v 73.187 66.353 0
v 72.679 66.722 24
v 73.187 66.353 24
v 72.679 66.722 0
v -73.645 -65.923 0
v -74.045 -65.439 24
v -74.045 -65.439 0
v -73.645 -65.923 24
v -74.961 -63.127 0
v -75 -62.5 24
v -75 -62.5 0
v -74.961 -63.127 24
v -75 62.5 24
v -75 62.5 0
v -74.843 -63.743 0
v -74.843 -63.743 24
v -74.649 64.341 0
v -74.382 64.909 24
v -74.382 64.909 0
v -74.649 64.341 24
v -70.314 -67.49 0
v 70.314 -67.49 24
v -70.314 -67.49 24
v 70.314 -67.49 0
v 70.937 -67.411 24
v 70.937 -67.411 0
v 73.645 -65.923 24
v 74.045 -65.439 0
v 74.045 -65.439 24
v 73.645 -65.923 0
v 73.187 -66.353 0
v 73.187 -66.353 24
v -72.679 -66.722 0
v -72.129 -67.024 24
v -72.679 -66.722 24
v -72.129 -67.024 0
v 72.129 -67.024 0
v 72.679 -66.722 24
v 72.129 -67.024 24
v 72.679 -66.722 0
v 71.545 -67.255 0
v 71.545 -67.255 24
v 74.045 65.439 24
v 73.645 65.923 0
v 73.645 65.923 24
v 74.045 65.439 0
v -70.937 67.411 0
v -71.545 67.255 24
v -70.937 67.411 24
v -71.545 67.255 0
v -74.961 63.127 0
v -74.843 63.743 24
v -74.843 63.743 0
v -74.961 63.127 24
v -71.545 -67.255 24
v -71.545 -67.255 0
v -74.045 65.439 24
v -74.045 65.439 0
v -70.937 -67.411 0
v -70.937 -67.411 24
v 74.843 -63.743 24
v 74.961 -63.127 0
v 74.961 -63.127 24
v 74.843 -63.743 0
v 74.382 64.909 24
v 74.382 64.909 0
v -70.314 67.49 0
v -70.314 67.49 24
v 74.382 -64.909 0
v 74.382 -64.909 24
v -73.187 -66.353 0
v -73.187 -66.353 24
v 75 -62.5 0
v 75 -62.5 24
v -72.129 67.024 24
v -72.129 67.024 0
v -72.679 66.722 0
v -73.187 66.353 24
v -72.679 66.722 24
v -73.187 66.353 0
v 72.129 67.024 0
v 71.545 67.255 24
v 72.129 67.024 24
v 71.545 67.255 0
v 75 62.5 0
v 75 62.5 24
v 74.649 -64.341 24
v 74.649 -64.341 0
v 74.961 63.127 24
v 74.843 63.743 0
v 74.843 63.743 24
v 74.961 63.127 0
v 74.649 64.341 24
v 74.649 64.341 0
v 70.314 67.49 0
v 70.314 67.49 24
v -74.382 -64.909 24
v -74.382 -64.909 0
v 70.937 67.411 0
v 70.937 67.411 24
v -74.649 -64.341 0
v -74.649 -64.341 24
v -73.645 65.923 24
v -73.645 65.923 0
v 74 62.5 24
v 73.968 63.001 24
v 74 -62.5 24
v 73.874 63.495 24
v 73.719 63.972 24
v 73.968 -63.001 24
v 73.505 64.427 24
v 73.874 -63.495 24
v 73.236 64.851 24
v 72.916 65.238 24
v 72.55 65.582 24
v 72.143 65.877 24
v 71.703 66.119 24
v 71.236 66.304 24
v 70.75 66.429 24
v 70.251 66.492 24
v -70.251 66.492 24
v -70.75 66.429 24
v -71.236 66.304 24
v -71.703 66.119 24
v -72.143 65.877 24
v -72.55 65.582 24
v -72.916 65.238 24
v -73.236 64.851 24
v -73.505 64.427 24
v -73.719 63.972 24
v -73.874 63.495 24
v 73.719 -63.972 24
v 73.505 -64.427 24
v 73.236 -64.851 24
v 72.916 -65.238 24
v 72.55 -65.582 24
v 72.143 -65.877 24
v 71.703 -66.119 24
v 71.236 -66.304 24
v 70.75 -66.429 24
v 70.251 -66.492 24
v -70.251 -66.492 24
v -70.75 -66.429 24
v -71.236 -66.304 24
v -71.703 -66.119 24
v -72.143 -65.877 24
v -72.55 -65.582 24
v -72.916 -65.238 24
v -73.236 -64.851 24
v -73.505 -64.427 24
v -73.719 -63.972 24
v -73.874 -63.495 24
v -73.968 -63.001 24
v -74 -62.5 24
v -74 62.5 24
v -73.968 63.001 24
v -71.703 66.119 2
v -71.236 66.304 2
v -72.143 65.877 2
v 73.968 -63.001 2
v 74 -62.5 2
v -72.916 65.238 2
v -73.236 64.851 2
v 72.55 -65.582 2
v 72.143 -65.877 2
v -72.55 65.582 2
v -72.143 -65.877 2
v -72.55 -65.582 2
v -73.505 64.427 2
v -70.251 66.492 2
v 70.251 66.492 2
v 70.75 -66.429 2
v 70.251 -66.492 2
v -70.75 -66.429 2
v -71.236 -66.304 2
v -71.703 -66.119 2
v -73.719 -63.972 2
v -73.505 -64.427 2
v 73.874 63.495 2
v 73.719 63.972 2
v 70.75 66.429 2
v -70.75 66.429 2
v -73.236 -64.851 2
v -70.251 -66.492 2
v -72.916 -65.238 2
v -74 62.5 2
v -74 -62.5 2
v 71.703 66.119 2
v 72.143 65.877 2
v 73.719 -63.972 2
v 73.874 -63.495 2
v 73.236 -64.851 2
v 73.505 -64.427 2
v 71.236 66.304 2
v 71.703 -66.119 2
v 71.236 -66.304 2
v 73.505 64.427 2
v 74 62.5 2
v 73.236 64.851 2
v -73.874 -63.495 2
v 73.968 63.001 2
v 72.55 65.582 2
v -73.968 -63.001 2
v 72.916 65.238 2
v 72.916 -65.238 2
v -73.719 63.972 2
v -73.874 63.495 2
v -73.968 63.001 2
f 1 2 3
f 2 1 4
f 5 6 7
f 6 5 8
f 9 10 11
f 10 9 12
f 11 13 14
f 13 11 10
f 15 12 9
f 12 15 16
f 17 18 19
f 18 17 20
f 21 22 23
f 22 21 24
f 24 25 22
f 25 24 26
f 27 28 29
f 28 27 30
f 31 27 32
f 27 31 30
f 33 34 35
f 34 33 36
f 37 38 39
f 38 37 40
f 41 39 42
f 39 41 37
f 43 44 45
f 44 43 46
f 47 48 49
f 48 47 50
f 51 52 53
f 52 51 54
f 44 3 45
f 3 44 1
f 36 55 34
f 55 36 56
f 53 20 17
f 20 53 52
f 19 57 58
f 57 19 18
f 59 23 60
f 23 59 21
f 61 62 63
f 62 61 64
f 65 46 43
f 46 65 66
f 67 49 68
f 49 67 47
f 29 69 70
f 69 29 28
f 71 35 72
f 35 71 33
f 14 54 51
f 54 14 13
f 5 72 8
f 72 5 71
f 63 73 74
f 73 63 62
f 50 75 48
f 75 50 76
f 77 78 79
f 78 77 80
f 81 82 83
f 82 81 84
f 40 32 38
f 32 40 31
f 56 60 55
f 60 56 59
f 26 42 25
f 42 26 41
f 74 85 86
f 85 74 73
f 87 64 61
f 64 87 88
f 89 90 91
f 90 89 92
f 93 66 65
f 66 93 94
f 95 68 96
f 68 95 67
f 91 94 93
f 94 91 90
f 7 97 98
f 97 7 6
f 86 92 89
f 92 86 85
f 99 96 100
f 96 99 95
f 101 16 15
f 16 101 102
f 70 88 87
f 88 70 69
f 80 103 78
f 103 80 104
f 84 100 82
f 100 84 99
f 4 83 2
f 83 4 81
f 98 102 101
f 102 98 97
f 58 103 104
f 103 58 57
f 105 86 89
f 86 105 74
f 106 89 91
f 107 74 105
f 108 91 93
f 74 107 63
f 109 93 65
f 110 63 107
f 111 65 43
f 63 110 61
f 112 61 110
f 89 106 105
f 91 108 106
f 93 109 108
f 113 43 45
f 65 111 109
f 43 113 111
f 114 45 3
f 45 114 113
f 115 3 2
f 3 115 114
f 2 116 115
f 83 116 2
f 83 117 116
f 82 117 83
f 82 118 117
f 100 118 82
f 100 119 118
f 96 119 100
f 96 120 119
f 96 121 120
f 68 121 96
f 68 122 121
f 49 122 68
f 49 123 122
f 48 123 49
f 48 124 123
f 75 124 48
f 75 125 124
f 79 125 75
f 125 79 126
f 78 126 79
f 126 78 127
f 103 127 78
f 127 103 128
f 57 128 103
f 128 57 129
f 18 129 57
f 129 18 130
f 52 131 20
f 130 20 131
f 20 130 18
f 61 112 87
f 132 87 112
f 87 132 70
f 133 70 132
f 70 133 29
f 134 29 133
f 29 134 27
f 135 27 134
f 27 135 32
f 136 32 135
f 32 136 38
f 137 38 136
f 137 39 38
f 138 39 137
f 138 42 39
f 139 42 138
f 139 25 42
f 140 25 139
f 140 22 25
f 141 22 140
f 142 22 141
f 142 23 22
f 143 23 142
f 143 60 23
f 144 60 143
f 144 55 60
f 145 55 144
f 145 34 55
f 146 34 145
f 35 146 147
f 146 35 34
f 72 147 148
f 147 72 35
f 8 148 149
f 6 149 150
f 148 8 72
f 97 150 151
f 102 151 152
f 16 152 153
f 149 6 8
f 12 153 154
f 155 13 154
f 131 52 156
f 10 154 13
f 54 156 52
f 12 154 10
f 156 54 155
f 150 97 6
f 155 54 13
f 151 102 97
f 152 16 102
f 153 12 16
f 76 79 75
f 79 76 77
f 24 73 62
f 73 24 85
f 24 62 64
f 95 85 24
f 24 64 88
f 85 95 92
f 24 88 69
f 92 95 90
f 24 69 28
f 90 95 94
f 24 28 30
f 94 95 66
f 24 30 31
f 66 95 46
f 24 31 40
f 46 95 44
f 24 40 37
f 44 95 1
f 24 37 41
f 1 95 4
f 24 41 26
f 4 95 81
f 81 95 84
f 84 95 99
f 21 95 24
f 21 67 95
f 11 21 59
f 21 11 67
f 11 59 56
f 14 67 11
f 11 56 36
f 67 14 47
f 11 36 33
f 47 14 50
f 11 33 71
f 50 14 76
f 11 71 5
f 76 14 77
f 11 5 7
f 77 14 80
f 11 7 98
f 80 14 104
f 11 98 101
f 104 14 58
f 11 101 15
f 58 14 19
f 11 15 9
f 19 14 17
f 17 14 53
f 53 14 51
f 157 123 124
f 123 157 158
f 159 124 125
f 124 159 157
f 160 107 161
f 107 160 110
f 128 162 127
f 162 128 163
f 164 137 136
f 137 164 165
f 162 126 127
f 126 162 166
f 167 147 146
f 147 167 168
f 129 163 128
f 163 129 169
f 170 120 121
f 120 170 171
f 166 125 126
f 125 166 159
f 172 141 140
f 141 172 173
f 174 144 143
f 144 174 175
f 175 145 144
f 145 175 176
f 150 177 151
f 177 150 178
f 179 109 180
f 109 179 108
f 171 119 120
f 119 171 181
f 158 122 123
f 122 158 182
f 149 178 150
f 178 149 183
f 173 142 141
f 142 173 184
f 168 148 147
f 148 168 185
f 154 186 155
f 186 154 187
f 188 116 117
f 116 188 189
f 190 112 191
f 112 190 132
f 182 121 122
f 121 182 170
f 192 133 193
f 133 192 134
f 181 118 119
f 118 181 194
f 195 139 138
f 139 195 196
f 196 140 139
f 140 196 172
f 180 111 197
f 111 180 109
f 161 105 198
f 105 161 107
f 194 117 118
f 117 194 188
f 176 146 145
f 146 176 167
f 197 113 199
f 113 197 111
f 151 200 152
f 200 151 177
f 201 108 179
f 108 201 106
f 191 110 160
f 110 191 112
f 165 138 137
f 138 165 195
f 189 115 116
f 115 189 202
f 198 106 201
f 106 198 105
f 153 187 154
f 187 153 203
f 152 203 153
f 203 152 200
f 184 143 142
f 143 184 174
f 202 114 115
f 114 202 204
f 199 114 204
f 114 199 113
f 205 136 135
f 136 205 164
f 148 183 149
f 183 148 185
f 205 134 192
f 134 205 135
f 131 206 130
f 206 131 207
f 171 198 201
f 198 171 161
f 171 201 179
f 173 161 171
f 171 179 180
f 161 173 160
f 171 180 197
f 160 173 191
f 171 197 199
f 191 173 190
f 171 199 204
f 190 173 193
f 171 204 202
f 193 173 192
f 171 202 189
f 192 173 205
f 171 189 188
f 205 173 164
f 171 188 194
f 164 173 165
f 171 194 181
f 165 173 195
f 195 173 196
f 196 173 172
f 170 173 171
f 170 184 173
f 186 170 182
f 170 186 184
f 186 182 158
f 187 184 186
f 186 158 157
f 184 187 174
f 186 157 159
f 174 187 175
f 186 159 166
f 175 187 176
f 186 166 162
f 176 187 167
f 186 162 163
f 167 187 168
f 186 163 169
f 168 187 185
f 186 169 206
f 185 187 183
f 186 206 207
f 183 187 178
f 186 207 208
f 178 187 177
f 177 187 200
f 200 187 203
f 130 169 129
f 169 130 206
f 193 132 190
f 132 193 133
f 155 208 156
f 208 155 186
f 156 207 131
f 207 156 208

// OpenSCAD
$fn = 50;


difference() {
	union() {
		hull() {
			translate(v = [-70.0000000000, 62.5000000000, 0]) {
				cylinder(h = 24, r = 5);
			}
			translate(v = [70.0000000000, 62.5000000000, 0]) {
				cylinder(h = 24, r = 5);
			}
			translate(v = [-70.0000000000, -62.5000000000, 0]) {
				cylinder(h = 24, r = 5);
			}
			translate(v = [70.0000000000, -62.5000000000, 0]) {
				cylinder(h = 24, r = 5);
			}
		}
	}
	union() {
		translate(v = [0, 0, 2]) {
			hull() {
				translate(v = [-70.0000000000, 62.5000000000, 0]) {
					cylinder(h = 22, r = 4);
				}
				translate(v = [70.0000000000, 62.5000000000, 0]) {
					cylinder(h = 22, r = 4);
				}
				translate(v = [-70.0000000000, -62.5000000000, 0]) {
					cylinder(h = 22, r = 4);
				}
				translate(v = [70.0000000000, -62.5000000000, 0]) {
					cylinder(h = 22, r = 4);
				}
			}
		}
	}
}
